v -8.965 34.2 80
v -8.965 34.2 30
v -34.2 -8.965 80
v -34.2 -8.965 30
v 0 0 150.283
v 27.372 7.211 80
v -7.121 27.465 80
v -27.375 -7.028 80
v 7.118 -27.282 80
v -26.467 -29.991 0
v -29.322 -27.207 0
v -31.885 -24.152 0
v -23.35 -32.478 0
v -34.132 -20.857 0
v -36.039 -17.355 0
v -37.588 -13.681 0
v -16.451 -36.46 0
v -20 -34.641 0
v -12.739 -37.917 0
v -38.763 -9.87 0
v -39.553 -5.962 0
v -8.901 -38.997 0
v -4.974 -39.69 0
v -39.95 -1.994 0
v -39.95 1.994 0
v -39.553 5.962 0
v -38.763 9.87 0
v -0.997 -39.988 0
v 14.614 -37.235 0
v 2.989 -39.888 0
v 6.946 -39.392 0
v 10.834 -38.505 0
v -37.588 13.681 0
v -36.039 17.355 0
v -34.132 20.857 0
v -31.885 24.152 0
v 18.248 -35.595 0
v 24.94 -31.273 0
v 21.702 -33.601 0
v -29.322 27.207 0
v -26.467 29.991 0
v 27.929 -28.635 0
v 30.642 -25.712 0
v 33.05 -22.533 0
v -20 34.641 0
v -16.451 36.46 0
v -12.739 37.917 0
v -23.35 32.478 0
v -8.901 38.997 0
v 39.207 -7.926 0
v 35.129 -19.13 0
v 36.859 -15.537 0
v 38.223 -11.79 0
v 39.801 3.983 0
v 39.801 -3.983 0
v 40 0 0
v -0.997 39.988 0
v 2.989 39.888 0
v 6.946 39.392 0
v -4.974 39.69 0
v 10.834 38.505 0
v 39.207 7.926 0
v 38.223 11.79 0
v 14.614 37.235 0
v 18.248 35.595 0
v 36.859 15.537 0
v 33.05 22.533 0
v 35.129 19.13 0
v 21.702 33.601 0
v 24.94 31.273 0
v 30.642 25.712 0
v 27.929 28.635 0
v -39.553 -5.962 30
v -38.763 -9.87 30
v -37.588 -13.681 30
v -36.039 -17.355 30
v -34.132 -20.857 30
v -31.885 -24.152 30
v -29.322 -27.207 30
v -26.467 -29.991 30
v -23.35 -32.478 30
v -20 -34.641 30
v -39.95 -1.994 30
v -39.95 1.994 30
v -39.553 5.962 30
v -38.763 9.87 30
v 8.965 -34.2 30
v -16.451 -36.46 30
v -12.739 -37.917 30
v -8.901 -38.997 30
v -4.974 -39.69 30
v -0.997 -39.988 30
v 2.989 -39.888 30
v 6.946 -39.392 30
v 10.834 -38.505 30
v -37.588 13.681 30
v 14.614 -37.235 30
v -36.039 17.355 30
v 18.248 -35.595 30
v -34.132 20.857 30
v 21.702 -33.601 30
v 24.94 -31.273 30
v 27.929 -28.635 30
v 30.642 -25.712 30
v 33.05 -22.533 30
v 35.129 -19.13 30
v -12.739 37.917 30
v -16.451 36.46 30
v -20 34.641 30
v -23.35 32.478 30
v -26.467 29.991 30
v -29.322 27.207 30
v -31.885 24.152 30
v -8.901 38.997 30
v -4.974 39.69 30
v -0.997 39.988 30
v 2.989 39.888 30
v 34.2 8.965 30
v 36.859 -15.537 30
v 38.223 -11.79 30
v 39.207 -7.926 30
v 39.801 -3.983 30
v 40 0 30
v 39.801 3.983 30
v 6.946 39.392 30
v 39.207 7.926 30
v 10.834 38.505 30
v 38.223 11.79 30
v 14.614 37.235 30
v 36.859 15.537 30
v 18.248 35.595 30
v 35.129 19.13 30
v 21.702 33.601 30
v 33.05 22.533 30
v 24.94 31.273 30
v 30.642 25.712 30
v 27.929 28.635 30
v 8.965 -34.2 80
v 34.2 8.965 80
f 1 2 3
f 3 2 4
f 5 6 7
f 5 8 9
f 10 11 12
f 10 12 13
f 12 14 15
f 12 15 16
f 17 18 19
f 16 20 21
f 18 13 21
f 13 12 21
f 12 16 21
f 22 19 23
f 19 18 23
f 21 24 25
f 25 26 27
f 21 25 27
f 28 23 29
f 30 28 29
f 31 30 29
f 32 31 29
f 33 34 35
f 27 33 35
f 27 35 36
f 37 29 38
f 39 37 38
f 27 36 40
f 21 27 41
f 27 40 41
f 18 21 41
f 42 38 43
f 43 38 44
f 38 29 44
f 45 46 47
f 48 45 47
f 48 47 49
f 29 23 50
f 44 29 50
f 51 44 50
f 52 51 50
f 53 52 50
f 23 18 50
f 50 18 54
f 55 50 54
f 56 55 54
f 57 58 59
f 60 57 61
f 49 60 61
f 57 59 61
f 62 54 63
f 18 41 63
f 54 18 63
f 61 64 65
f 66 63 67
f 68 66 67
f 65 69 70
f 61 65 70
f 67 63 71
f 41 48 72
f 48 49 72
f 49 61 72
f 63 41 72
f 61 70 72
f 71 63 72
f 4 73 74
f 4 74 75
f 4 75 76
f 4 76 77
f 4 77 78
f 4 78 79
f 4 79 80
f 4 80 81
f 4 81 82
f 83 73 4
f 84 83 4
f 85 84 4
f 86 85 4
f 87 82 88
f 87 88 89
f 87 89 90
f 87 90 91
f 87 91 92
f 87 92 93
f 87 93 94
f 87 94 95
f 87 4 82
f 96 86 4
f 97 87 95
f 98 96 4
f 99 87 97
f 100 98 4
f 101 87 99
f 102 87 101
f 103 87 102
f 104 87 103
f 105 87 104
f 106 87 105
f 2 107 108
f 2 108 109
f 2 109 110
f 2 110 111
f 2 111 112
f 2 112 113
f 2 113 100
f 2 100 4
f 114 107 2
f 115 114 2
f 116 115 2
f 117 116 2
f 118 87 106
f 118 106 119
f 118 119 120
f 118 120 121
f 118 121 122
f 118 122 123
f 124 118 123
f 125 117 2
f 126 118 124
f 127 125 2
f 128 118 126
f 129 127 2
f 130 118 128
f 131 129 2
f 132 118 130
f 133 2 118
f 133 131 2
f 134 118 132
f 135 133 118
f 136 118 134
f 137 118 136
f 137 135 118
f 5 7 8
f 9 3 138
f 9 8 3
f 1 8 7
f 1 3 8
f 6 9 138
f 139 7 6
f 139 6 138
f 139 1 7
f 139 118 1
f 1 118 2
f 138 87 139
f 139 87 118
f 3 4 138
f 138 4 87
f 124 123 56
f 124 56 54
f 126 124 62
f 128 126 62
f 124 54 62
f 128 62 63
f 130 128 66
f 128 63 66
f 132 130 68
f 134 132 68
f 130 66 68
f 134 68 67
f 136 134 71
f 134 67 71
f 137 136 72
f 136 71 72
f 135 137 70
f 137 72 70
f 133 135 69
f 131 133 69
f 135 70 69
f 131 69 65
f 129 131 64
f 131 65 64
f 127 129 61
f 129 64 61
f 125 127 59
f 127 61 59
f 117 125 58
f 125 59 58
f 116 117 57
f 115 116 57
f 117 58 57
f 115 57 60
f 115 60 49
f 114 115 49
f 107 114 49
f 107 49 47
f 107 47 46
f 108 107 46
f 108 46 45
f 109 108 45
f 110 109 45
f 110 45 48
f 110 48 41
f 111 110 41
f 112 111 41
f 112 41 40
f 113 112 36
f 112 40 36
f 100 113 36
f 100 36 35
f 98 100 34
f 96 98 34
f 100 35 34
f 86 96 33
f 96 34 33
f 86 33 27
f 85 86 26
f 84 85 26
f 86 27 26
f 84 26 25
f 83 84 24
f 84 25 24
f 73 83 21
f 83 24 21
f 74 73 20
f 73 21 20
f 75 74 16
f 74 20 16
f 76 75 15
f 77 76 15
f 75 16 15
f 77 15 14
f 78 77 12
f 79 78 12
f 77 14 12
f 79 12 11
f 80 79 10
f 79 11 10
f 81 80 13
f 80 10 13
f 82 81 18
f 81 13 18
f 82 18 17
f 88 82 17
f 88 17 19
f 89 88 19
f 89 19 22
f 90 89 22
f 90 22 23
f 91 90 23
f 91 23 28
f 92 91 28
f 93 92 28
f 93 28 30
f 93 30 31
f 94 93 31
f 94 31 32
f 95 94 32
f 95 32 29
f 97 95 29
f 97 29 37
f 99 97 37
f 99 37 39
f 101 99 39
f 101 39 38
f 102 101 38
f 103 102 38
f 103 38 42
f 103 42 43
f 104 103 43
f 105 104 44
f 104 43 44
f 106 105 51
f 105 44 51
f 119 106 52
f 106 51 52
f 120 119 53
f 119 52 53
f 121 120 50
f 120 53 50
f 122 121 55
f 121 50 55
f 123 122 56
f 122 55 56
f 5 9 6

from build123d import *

# Parameters (mm, degrees)
F0_R     = 40
F1_DEPTH = 30
F3_DEPTH = 50


with BuildPart() as f1:
    # F0 (on Top) → F1 (new body)
    with BuildSketch(Plane.XY):
        Circle(F0_R)
    extrude(amount=F1_DEPTH)

    # F2 (on face) → F3 (join)
    with BuildSketch(Plane.XY.offset(30)):
        Polygon((34.199837, 8.964997), (-8.964997, 34.199837), (-34.199837, -8.964997), (8.964997, -34.199837), align=None)
    extrude(amount=F3_DEPTH)

    # F4 (on face) → F6 section 0
    with BuildSketch(Plane.XY.offset(80), mode=Mode.PRIVATE) as f6_s0:
        Polygon((-7.121267, 27.464645), (-27.375315, -7.028449), (7.117778, -27.282497), (27.371827, 7.210596), align=None)
    loft([f6_s0.sketch, Vertex(0, 0, 150.282912)])


solid = f1.part
